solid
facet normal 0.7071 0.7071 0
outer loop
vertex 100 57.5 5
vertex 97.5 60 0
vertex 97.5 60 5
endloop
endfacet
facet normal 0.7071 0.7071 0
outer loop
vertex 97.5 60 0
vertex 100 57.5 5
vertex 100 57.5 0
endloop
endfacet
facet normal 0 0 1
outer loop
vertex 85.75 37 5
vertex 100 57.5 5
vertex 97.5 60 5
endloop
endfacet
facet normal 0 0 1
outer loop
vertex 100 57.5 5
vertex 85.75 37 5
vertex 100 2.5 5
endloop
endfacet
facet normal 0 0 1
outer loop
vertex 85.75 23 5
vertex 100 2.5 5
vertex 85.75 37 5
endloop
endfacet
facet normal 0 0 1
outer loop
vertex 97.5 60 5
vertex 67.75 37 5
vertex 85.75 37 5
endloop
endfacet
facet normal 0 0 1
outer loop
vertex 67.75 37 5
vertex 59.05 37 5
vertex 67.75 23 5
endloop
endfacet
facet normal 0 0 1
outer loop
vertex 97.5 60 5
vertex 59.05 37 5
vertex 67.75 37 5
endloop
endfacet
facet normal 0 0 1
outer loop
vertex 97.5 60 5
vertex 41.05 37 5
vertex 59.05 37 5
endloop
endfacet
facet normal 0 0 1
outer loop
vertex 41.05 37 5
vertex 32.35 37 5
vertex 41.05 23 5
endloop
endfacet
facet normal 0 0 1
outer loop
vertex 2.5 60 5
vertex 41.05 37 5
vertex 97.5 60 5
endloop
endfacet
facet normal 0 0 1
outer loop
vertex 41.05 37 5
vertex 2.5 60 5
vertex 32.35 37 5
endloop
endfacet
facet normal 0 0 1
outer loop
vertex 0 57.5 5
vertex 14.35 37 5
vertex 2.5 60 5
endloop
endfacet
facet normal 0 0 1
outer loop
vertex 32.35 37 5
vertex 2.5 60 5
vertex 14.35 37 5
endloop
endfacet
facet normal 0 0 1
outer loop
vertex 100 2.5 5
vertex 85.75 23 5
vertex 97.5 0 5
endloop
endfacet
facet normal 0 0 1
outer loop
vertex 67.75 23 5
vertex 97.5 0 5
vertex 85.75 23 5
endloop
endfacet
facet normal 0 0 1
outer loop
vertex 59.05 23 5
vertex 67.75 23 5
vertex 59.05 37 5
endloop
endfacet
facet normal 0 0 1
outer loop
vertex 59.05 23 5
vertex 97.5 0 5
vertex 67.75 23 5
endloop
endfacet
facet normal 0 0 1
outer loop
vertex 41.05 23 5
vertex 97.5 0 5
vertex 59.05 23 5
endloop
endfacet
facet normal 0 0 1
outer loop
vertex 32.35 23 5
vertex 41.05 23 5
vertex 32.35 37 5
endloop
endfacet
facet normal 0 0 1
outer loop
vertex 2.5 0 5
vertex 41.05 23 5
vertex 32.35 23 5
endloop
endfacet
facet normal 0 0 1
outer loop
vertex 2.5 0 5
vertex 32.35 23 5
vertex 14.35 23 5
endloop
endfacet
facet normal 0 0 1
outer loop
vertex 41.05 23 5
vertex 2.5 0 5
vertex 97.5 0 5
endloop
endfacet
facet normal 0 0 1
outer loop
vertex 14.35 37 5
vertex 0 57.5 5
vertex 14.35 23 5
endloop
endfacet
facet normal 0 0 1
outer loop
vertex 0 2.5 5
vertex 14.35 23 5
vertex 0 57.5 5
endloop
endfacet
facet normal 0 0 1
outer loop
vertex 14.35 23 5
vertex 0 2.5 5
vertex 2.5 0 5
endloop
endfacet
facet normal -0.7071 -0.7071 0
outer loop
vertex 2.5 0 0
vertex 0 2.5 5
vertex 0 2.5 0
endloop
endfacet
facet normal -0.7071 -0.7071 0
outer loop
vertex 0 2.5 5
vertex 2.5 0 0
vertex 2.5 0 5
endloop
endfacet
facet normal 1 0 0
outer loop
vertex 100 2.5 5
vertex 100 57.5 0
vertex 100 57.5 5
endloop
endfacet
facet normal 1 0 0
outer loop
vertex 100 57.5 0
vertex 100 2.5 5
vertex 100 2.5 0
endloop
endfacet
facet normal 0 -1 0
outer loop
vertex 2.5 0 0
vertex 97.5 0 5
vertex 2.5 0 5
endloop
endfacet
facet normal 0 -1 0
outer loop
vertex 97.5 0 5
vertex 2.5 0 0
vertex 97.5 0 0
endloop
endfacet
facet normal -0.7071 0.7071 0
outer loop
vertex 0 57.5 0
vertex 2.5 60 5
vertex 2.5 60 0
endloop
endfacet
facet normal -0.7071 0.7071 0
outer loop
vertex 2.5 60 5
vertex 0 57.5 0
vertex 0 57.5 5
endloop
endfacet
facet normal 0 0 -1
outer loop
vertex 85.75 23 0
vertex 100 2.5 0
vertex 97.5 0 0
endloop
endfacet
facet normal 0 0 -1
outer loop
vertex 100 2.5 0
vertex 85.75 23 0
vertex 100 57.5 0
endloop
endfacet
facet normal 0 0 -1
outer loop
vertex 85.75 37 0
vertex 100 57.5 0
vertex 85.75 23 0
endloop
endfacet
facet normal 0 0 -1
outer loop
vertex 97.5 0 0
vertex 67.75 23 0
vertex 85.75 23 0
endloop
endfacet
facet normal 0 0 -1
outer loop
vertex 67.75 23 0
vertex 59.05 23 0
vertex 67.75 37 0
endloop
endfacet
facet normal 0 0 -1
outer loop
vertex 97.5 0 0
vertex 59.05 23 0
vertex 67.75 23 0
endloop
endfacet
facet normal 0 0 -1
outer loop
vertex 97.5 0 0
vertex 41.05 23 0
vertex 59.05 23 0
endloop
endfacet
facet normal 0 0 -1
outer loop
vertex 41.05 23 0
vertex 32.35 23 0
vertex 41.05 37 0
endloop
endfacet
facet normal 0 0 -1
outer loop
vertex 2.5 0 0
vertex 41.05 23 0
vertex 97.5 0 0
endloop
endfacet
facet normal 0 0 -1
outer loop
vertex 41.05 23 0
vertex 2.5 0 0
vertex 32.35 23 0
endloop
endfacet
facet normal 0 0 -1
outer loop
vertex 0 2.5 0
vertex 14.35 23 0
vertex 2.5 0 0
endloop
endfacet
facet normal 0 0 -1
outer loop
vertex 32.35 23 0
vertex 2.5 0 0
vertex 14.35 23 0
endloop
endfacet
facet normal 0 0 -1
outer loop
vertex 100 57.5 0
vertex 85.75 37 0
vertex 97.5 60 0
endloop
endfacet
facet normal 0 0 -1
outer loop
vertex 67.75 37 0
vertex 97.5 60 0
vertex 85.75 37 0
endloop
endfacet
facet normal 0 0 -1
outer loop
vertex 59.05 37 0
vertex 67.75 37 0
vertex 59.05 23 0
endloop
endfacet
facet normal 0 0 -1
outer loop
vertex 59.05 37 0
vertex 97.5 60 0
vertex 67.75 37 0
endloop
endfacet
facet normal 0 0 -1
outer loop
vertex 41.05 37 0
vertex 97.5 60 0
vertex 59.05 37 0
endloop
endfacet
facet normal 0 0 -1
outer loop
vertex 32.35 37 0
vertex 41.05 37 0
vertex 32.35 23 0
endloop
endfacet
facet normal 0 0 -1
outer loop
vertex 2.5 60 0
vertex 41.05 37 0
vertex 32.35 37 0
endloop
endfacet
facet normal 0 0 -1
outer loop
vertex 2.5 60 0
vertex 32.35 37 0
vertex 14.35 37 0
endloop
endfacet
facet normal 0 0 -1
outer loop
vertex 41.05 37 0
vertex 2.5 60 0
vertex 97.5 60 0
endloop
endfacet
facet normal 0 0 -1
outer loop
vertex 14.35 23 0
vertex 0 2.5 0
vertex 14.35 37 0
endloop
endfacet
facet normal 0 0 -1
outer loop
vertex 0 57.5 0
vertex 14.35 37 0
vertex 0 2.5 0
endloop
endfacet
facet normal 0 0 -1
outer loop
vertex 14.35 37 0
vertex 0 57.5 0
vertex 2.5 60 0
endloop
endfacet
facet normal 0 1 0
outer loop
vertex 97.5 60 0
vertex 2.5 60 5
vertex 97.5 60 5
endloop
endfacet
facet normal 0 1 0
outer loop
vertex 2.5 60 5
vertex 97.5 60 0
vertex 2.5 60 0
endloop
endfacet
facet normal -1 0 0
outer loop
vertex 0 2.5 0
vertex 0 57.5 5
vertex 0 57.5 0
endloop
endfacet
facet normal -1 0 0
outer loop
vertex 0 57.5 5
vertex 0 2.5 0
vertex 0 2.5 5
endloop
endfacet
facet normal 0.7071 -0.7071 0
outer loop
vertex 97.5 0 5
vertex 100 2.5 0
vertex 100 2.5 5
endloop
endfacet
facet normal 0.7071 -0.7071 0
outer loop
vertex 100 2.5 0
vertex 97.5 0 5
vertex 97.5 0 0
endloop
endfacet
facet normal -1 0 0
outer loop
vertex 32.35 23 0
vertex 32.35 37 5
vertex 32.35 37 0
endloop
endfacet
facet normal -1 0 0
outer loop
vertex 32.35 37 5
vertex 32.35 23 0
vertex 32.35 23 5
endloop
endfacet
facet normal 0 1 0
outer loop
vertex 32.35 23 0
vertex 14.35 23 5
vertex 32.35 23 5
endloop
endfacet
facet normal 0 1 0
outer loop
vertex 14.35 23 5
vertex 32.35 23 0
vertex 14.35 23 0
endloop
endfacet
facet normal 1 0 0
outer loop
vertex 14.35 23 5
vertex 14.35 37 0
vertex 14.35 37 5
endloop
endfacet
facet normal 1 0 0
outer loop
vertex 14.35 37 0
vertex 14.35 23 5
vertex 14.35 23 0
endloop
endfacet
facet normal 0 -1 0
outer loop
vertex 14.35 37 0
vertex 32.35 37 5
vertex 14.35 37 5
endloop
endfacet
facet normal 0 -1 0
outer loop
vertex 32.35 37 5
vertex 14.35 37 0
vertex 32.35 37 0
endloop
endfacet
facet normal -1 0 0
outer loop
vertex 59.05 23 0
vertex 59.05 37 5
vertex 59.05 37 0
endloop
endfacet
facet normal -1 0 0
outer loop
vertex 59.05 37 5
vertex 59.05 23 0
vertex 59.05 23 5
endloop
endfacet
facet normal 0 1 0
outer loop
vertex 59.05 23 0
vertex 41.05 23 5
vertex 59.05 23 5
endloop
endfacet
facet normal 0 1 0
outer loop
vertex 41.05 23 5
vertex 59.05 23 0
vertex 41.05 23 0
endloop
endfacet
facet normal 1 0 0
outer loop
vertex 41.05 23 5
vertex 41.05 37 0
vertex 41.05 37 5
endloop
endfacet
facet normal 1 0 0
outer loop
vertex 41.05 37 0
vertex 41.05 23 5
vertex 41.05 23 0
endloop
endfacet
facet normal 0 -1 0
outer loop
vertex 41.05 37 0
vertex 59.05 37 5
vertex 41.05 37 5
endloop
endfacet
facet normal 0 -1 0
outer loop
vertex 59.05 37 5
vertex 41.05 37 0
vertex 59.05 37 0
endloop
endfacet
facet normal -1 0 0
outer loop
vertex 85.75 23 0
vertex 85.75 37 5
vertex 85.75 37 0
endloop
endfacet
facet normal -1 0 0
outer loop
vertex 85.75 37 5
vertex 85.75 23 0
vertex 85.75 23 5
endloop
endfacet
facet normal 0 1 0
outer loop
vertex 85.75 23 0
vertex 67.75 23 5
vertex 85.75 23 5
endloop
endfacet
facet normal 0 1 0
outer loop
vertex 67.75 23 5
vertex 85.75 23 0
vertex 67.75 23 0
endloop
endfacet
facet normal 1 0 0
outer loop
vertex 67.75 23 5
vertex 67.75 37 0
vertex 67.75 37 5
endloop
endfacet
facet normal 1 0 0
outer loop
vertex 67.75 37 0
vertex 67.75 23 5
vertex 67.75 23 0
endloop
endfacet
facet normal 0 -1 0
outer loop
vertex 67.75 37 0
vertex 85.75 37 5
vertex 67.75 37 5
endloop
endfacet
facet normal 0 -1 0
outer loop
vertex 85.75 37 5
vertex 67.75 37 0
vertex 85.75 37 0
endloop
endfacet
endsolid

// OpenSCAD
$fn = 32;

// ----------------------------------------------------------------------
// Windowed plate: 3 voids, 100 x 60 x 5 mm
// ----------------------------------------------------------------------

// --- parameters (mm) ---
plate_l = 100;            // plate length, X
plate_w = 60;             // plate width, Y
plate_t = 5;              // plate thickness, Z
edge_margin = 10;         // wall from the plate edge to any window
windows = 3;              // number of windows in the row
win_l = 18;               // window length
win_w = 14;               // window width
win_pitch = 26.7;         // window pitch along X
depth_1 = 5;              // depth of void 1 (full thickness = through)
depth_2 = 5;              // depth of void 2 (full thickness = through)
depth_3 = 5;              // depth of void 3 (full thickness = through)
corner_c = 2.5;           // corner chamfer of the plate

profile = [[2.5, 0], [97.5, 0], [100, 2.5], [100, 57.5], [97.5, 60], [2.5, 60], [0, 57.5], [0, 2.5]];  // primary outline, 8 points, counter clockwise
void_1 = [[14.35, 23], [32.35, 23], [32.35, 37], [14.35, 37]];  // window 1 of the row, 4 points
void_2 = [[41.05, 23], [59.05, 23], [59.05, 37], [41.05, 37]];  // window 2 of the row, 4 points
void_3 = [[67.75, 23], [85.75, 23], [85.75, 37], [67.75, 37]];  // window 3 of the row, 4 points

// --- the one profile operation ---
difference() {
  linear_extrude(height = plate_t) polygon(points = profile);
  translate([0, 0, -1])
    linear_extrude(height = plate_t + 2) polygon(points = void_1);
  translate([0, 0, -1])
    linear_extrude(height = plate_t + 2) polygon(points = void_2);
  translate([0, 0, -1])
    linear_extrude(height = plate_t + 2) polygon(points = void_3);
}
